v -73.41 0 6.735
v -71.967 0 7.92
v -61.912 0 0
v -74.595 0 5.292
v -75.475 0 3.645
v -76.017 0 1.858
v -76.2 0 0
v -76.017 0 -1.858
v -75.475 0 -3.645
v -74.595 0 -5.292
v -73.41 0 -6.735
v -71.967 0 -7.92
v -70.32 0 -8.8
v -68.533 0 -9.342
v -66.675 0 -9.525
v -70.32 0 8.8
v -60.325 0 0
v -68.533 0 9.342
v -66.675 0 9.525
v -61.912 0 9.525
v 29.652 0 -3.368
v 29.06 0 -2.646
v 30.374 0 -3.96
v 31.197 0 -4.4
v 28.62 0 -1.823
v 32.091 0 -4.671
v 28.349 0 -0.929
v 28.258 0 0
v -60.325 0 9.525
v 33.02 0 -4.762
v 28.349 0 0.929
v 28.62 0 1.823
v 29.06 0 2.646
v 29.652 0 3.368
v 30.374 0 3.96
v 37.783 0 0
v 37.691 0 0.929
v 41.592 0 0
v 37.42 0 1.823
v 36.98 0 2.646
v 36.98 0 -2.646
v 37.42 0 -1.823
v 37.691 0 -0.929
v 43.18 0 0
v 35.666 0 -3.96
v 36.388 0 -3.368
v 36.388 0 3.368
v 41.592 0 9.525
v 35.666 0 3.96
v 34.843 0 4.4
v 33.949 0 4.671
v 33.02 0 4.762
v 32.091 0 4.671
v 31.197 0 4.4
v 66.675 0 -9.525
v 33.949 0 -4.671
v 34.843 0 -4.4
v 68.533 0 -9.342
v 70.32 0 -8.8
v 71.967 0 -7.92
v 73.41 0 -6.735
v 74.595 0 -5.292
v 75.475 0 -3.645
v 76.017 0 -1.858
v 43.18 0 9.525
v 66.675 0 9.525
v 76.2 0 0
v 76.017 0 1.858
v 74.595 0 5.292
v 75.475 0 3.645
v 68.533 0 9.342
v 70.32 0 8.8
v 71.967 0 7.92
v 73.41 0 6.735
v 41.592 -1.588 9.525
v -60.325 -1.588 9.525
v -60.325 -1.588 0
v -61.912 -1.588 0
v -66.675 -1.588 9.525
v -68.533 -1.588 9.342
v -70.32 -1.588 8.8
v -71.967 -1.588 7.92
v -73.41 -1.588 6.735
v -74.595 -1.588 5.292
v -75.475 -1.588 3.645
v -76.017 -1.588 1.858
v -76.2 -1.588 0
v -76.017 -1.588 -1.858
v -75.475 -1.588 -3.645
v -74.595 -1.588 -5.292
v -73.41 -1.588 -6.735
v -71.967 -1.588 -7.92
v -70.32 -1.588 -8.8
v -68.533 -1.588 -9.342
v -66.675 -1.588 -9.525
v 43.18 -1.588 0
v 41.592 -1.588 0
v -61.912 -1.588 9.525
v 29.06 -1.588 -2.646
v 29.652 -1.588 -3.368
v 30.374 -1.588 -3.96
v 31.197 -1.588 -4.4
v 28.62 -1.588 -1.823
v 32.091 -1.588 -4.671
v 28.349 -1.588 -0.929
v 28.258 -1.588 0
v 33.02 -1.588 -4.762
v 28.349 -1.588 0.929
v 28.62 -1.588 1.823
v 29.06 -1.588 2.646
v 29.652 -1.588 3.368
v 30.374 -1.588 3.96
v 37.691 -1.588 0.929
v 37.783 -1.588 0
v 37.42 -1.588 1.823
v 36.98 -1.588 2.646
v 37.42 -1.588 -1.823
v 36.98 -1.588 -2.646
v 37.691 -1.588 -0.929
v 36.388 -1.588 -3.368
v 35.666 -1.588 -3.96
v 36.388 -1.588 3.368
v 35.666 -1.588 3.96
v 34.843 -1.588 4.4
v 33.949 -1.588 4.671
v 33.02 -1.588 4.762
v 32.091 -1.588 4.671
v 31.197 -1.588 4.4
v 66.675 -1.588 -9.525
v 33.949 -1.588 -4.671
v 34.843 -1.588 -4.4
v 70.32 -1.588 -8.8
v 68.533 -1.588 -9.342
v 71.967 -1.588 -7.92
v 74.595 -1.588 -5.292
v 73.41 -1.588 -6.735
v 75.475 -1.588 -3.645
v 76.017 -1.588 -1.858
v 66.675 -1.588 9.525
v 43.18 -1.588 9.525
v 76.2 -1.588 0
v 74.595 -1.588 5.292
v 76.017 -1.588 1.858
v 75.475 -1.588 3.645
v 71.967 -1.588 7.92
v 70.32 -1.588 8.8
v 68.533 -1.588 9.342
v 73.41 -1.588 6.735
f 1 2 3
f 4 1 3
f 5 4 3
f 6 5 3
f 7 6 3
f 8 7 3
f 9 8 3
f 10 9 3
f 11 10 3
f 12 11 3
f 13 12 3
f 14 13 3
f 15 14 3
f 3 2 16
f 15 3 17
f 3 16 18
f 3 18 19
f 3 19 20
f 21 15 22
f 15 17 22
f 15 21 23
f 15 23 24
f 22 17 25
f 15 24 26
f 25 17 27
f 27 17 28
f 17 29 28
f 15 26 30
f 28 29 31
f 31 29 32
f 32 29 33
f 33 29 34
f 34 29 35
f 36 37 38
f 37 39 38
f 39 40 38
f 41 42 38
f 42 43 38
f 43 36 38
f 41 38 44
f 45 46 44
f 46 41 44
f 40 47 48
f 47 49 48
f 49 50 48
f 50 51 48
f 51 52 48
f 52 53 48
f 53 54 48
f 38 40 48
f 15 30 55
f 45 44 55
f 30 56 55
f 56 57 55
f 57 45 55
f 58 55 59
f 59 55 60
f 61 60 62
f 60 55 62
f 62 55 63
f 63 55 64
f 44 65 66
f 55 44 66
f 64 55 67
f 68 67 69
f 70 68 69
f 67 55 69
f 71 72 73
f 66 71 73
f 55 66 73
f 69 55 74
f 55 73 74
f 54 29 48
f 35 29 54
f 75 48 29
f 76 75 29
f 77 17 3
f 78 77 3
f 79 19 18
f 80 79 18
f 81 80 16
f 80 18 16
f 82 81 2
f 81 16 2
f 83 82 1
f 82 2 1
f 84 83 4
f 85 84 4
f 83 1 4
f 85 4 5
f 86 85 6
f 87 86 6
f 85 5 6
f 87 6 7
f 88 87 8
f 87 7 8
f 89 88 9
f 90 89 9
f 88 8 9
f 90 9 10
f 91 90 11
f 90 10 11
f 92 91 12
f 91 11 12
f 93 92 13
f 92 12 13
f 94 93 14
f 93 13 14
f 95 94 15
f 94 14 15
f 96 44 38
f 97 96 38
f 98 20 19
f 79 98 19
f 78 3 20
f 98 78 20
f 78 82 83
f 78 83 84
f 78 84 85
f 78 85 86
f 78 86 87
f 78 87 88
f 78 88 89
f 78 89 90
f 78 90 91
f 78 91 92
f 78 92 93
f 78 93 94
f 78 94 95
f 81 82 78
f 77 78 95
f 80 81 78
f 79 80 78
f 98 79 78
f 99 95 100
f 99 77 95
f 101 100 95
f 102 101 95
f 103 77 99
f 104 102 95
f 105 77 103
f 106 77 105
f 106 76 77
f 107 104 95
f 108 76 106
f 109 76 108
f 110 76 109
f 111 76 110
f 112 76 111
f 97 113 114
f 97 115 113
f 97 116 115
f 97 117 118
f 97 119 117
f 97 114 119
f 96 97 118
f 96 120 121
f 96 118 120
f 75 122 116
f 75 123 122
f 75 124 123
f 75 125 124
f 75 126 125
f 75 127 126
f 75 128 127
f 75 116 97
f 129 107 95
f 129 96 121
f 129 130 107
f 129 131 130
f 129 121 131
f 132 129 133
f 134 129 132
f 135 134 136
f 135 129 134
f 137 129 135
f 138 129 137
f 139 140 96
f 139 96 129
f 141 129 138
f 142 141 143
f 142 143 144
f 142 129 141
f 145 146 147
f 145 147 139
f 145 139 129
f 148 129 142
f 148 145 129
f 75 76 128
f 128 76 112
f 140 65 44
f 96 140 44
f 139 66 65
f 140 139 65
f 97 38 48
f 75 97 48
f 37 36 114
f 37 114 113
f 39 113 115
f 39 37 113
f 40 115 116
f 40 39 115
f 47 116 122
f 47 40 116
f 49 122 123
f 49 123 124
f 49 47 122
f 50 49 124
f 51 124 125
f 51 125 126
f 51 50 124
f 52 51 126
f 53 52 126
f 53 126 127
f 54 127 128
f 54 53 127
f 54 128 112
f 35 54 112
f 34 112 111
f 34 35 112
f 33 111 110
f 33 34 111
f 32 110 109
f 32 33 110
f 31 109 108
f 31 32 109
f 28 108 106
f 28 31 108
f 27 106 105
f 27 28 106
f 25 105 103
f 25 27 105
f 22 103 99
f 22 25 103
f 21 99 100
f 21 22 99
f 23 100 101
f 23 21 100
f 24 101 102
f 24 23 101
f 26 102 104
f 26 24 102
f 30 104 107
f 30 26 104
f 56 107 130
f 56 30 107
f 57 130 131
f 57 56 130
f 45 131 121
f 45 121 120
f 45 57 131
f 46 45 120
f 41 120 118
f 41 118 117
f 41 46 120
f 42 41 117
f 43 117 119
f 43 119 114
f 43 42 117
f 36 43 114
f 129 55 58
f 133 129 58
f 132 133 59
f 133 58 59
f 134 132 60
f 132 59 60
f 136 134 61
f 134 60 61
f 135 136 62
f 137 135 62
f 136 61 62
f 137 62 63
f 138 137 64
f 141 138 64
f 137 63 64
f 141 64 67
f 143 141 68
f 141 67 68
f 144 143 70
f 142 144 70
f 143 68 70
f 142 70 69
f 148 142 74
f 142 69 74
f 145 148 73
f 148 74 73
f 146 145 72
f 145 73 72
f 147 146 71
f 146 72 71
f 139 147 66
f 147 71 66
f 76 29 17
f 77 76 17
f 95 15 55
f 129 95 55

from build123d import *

# Parameters (mm, degrees)
F0_R     = 4.7625
F1_DEPTH = 1.5875


with BuildPart() as f1:
    # F0 (on Front) → F1 (new body)
    with BuildSketch(Plane.XZ):
        with BuildLine():
            Line((-66.675, -9.525), (66.675, -9.525))
            ThreePointArc((66.675, -9.525), (76.2, 0), (66.675, 9.525))
            Line((66.675, 9.525), (43.18, 9.525))
            Line((43.18, 9.525), (43.18, 0))
            Line((43.18, 0), (41.5925, 0))
            Line((41.5925, 0), (41.5925, 9.525))
            Line((41.5925, 9.525), (-60.325, 9.525))
            Line((-60.325, 9.525), (-60.325, 0))
            Line((-60.325, 0), (-61.9125, 0))
            Line((-61.9125, 0), (-61.9125, 9.525))
            Line((-61.9125, 9.525), (-66.675, 9.525))
            ThreePointArc((-66.675, 9.525), (-76.2, 0), (-66.675, -9.525))
        make_face()
        with Locations((33.02, 0)):
            Circle(F0_R, mode=Mode.SUBTRACT)
    extrude(amount=F1_DEPTH)


solid = f1.part
